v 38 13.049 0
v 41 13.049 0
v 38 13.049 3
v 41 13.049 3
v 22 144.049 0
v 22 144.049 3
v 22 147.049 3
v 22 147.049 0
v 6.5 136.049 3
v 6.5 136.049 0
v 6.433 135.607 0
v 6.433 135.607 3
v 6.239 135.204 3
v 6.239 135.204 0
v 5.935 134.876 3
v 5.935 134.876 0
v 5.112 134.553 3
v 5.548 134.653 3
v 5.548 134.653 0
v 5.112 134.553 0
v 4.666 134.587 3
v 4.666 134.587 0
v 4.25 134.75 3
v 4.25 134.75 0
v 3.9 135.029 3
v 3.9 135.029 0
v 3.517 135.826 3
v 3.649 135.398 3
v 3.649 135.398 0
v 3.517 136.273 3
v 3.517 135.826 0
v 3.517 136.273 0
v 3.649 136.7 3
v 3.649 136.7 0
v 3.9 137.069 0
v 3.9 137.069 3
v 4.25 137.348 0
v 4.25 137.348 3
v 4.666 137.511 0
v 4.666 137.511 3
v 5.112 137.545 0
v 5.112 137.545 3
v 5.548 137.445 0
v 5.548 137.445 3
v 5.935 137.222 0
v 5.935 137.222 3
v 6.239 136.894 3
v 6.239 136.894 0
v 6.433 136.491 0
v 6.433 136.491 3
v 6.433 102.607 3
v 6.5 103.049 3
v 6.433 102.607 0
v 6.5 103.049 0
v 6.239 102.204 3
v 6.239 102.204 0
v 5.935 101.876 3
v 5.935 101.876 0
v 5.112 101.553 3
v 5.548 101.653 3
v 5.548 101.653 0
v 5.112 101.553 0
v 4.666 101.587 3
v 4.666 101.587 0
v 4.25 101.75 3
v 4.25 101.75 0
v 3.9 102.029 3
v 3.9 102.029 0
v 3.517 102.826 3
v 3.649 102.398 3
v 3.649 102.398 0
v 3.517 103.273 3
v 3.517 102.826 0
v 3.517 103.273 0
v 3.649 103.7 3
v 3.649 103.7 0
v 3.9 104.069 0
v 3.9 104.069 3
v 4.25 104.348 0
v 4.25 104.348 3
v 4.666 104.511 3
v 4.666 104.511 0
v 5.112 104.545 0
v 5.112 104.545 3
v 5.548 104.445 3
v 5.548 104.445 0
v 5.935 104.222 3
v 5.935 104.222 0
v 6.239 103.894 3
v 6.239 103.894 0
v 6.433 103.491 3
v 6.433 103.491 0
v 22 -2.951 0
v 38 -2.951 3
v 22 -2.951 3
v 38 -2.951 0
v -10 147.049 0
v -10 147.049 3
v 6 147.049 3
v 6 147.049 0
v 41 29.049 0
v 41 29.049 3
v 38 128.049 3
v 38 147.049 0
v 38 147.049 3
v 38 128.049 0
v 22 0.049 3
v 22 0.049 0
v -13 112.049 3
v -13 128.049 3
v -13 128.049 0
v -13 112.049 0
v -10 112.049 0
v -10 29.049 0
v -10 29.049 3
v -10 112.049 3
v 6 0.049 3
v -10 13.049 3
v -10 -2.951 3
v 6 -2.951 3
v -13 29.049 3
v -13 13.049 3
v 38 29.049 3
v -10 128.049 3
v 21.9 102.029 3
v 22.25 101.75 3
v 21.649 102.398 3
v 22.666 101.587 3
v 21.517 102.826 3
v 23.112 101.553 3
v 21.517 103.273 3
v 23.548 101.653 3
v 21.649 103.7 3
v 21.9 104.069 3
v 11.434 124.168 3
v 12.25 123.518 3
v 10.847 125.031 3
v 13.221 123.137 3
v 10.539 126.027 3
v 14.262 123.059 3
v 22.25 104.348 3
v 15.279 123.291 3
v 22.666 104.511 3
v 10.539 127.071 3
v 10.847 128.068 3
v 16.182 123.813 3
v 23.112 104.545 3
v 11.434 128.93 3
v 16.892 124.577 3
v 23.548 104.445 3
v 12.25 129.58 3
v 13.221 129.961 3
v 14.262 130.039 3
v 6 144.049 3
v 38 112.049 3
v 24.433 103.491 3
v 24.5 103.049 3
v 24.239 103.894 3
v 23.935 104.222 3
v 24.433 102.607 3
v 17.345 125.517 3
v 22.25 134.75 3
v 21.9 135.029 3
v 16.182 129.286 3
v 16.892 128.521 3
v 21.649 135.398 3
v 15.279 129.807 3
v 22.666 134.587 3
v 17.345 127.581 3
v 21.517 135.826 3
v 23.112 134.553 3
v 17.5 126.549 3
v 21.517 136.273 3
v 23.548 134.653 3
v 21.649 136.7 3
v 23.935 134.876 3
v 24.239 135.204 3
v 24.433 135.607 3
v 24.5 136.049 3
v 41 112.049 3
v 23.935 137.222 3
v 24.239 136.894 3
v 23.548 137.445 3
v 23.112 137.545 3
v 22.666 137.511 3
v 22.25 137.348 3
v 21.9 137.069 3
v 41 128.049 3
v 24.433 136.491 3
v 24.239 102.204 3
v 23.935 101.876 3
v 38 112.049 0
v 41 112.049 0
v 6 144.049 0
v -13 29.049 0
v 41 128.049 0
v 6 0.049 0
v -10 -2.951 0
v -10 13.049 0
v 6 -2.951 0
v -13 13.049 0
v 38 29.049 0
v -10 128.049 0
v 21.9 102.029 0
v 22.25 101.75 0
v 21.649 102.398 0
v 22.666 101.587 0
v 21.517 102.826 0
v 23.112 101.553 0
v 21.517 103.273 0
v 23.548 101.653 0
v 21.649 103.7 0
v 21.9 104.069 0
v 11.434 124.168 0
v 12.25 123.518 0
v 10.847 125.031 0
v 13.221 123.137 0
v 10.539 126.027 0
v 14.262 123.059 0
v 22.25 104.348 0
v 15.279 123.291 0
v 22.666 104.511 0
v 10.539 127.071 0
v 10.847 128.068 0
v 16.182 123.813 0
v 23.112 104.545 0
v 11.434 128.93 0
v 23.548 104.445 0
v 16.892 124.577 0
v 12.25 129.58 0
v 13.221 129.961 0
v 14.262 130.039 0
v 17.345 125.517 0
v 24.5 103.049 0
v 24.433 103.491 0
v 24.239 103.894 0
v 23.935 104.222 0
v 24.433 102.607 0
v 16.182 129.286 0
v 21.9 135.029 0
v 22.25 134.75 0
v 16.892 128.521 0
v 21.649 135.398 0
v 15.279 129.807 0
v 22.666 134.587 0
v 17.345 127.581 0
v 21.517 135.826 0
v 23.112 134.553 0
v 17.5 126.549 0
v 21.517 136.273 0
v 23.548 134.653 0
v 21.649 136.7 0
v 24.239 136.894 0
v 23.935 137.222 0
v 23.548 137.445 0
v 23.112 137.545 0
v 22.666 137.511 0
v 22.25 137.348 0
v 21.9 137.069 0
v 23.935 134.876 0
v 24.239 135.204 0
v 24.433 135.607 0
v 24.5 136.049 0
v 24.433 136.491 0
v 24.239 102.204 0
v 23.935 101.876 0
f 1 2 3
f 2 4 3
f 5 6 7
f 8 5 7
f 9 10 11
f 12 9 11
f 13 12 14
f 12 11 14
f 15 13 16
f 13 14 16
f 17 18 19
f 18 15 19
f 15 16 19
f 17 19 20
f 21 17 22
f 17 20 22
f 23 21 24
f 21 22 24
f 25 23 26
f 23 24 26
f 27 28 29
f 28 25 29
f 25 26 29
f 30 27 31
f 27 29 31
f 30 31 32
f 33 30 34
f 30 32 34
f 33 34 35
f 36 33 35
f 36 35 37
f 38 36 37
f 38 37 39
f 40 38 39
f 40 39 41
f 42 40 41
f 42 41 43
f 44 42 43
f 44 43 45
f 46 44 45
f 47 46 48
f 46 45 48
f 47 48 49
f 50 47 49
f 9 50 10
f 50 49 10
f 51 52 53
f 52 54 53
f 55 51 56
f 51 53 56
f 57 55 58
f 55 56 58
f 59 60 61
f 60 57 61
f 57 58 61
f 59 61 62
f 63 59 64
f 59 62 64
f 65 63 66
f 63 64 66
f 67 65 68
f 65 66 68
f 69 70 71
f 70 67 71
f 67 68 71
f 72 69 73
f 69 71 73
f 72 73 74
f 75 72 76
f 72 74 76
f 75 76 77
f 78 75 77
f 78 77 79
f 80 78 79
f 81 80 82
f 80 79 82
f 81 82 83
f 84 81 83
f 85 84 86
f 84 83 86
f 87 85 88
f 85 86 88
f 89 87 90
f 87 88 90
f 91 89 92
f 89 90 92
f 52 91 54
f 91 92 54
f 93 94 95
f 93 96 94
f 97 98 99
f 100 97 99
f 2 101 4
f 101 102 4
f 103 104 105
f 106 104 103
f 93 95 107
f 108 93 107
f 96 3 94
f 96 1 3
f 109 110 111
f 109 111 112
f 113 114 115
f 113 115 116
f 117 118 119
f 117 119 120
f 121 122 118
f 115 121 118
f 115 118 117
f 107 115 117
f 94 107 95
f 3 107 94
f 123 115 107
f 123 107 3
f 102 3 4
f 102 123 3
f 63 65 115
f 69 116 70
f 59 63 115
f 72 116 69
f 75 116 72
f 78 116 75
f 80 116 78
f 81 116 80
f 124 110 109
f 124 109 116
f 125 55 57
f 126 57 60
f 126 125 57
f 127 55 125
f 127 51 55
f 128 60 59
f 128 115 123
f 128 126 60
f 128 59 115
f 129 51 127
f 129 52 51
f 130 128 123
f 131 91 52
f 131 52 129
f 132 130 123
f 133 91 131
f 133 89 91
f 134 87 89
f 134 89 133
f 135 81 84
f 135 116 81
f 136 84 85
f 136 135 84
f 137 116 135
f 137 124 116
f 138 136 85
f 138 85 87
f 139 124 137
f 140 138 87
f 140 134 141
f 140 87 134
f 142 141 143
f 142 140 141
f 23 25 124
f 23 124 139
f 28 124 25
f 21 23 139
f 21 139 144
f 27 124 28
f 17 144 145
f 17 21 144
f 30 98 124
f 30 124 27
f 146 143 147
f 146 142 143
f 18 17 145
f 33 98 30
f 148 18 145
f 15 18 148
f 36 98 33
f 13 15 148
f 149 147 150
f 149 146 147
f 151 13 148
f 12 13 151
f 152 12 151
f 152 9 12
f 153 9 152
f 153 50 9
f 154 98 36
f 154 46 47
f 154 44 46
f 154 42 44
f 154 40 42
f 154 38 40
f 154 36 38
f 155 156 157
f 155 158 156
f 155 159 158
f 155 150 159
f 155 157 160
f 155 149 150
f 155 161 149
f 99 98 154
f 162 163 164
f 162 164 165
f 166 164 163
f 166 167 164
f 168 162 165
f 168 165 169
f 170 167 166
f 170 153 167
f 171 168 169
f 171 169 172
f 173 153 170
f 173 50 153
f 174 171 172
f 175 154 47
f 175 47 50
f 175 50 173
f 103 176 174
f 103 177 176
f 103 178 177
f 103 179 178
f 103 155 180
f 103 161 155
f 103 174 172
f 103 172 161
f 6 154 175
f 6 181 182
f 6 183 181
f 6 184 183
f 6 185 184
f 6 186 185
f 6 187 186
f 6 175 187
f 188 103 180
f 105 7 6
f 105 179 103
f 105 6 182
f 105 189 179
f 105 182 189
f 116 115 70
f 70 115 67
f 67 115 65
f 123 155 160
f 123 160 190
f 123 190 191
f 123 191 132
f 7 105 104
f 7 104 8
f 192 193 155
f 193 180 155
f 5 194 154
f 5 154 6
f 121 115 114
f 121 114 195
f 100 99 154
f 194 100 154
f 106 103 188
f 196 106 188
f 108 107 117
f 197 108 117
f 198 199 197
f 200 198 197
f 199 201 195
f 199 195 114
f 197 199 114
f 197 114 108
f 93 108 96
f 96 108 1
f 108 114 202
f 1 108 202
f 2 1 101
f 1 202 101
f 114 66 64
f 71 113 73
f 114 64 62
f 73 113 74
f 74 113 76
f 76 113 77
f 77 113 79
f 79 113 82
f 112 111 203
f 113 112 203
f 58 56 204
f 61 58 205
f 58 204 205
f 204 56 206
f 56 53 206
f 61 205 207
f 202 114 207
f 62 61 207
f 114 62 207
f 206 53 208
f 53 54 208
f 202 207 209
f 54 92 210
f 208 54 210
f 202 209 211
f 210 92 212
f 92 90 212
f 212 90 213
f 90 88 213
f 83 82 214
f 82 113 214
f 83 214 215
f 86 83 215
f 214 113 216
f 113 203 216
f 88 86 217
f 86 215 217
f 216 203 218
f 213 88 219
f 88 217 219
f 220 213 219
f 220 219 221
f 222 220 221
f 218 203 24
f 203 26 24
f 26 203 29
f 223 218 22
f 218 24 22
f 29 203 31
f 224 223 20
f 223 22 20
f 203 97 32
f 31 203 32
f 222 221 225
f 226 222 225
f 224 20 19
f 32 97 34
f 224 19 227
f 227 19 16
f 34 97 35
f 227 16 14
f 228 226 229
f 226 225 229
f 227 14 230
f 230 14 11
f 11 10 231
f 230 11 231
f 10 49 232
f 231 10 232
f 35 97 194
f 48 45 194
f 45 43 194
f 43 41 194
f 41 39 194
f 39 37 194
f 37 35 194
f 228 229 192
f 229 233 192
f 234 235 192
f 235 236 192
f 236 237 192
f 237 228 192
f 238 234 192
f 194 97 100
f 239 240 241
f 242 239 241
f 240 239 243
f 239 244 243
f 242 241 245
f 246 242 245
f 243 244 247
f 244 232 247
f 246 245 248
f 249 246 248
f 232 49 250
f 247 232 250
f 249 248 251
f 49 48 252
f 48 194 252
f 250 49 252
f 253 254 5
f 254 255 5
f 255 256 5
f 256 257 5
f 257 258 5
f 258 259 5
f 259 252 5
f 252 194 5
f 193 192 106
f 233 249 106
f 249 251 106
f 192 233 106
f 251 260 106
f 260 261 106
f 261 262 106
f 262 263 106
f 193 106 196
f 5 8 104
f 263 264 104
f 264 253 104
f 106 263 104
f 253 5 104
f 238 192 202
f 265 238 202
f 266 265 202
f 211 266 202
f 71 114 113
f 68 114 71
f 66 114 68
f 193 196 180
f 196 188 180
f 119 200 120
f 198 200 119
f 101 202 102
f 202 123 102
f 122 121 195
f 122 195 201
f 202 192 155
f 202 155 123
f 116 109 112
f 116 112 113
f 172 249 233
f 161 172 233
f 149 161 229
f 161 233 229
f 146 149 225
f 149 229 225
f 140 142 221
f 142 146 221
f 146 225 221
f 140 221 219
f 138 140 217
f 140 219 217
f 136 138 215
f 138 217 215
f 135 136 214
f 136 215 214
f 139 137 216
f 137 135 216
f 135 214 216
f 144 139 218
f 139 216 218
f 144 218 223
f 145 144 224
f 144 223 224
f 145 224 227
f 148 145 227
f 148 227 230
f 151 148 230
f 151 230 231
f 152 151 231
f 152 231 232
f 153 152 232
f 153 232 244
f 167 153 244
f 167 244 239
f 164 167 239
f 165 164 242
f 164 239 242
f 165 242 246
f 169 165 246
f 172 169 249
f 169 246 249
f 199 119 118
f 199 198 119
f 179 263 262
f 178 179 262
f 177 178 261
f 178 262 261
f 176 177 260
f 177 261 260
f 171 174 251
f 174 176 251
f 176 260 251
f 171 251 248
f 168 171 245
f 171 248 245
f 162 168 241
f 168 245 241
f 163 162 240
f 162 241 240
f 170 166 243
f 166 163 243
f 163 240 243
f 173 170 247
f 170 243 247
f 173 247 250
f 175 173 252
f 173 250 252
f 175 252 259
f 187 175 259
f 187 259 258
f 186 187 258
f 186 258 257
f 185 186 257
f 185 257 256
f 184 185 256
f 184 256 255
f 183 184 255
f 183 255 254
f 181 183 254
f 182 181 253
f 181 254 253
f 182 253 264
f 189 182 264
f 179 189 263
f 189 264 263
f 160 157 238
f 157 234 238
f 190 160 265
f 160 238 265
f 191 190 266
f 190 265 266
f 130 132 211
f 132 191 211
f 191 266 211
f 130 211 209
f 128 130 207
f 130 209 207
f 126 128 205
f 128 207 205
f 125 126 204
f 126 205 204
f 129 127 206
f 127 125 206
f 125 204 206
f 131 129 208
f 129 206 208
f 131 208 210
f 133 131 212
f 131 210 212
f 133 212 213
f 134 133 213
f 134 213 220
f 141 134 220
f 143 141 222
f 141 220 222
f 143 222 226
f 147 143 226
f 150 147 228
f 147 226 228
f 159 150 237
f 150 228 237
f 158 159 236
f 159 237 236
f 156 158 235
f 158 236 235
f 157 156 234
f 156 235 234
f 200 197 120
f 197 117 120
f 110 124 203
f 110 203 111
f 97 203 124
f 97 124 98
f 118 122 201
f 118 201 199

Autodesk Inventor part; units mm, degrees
ref_plane "YZ Plane" through (0, 0, 0) normal (1, 0, 0) x (0, 1, 0)
ref_plane "XZ Plane" through (0, 0, 0) normal (0, 1, 0) x (-1, 0, 0)
ref_plane "XY Plane" through (0, 0, 0) normal (0, 0, 1) x (1, 0, 0)
sketch "Sketch1" plane through (0, 0, 0) normal (0, 0, 1) x (1, 0, 0)
  circle A0 centre (23, 103.0491) radius 1.5
  circle A1 centre (5, 103.0491) radius 1.5
  circle A2 centre (23, 136.0491) radius 1.5
  line L0 (-10, 144.0491) -> (38, 144.0491)
  line L1 (38, 144.0491) -> (38, -2.9509)
  line L2 (38, -2.9509) -> (-10, -2.9509)
  line L3 (-10, -2.9509) -> (-10, 144.0491)
  circle A3 centre (5, 136.0491) radius 1.5
  circle A4 centre (14, 126.5491) radius 3.5
  point P0 (0, 0)
  point P1 (14, 22.75)
  dimension "d10" = 3
  dimension "d12" = 3
  dimension "d13" = 3
  dimension "d14" = 3
  dimension "d15" = 33
  dimension "d16" = 18
  dimension "d17" = 18
  dimension "d18" = 33
  dimension "d19" = 15
  dimension "d20" = 8
  dimension "d21" = 15
  dimension "d22" = 147
  dimension "d25" = 7
  dimension "d26" = 9.5
  dimension "d27" = 9
  dimension "d28" = 9
  dimension "d29" = 2.9509
  dimension "d30" = 10
  dimension "d31" = 0
extrude "Extrusion1" add sketch "Sketch1" along normal blind 3
sketch "Sketch2" plane through (0, 0, 3) normal (0, 0, 1) x (1, 0, 0)
  line L0 (-10, 144.0491) -> (-10, -2.9509) projected
  line L1 (38, -2.9509) -> (38, 144.0491) projected
  line L2 (-10, 128.0491) -> (-13, 128.0491)
  line L3 (-13, 128.0491) -> (-13, 112.0491)
  line L4 (-13, 112.0491) -> (-10, 112.0491)
  line L5 (-10, 112.0491) -> (-10, 128.0491)
  line L6 (38, 128.0491) -> (41, 128.0491)
  line L7 (41, 128.0491) -> (41, 112.0491)
  line L8 (41, 112.0491) -> (38, 112.0491)
  line L9 (38, 112.0491) -> (38, 128.0491)
  line L10 (-10, 29.0491) -> (-13, 29.0491)
  line L11 (-13, 29.0491) -> (-13, 13.0491)
  line L12 (-13, 13.0491) -> (-10, 13.0491)
  line L13 (-10, 13.0491) -> (-10, 29.0491)
  line L14 (38, 29.0491) -> (41, 29.0491)
  line L15 (41, 29.0491) -> (41, 13.0491)
  line L16 (41, 13.0491) -> (38, 13.0491)
  line L17 (38, 13.0491) -> (38, 29.0491)
  line L18 (-10, -2.9509) -> (38, -2.9509) projected
  line L19 (38, 144.0491) -> (-10, 144.0491) projected
  line L20 (6, 144.0491) -> (22, 144.0491)
  line L21 (22, 144.0491) -> (22, 147.0491)
  line L22 (22, 147.0491) -> (6, 147.0491)
  line L23 (6, 147.0491) -> (6, 144.0491)
  line L24 (6, 144.0491) -> (-10, 144.0491)
  line L25 (-10, 144.0491) -> (-10, 147.0491)
  line L26 (-10, 147.0491) -> (6, 147.0491)
  line L27 (6, 147.0491) -> (6, 144.0491)
  line L28 (22, 144.0491) -> (38, 144.0491)
  line L29 (38, 144.0491) -> (38, 147.0491)
  line L30 (38, 147.0491) -> (22, 147.0491)
  line L31 (22, 147.0491) -> (22, 144.0491)
  point P0 (0, 0)
  point P1 (-11.5, 13.0491)
  point P2 (-10, 112.0491)
  point P3 (38, 112.0491)
  point P4 (22, 147.0491)
  point P5 (22, 144.0491)
  point P6 (-10, 144.0491)
  point P7 (6, 147.0491)
  dimension "d36" = 3
  dimension "d37" = 3
  dimension "d39" = 16
  dimension "d40" = 16
  dimension "d41" = 16
  dimension "d42" = 0
  dimension "d50" = 16
  dimension "d51" = 16
  dimension "d52" = 3
  dimension "d53" = 3
  dimension "d56" = 16
extrude "Extrusion2" add sketch "Sketch2" against normal blind 3 contours L25 L26 L23 L19 | L0 L4 L3 L2 | L21 L30 L29 L19 | L0 L12 L11 L10 | L6 L7 L8 L1 | L14 L15 L16 L1
sketch "Sketch4" plane through (0, 0, 3) normal (0, 0, 1) x (1, 0, 0)
  line L0 (-10, -2.9509) -> (38, -2.9509) projected
  line L1 (6, -2.9509) -> (22, -2.9509)
  line L2 (22, -2.9509) -> (22, 0.0491)
  line L3 (22, 0.0491) -> (6, 0.0491)
  line L4 (6, 0.0491) -> (6, -2.9509)
  line L5 (22, 144.0491) -> (6, 144.0491) projected
  line L6 (6, 144.0491) -> (6, 147.0491) projected
  point P0 (0, 0)
extrude "Extrusion4" cut sketch "Sketch4" against normal blind 3
equation "\"BendRadius\" = Thickness"
equation "\"BendReliefWidth\" = Thickness"
equation "\"BendReliefDepth\" = 0.5 * Thickness"
equation "\"CornerReliefSize\" = 4 * Thickness"
equation "\"MinimumRemnant\" = 2 * Thickness"
equation "\"TransitionRadius\" = BendRadius"
equation "\"JacobiRadiusSize\" = BendRadius"
equation "\"GapSize\" = Thickness"
equation "\"Thickness\" = 0.5"
properties part number "side plate" material "Hardboard"
